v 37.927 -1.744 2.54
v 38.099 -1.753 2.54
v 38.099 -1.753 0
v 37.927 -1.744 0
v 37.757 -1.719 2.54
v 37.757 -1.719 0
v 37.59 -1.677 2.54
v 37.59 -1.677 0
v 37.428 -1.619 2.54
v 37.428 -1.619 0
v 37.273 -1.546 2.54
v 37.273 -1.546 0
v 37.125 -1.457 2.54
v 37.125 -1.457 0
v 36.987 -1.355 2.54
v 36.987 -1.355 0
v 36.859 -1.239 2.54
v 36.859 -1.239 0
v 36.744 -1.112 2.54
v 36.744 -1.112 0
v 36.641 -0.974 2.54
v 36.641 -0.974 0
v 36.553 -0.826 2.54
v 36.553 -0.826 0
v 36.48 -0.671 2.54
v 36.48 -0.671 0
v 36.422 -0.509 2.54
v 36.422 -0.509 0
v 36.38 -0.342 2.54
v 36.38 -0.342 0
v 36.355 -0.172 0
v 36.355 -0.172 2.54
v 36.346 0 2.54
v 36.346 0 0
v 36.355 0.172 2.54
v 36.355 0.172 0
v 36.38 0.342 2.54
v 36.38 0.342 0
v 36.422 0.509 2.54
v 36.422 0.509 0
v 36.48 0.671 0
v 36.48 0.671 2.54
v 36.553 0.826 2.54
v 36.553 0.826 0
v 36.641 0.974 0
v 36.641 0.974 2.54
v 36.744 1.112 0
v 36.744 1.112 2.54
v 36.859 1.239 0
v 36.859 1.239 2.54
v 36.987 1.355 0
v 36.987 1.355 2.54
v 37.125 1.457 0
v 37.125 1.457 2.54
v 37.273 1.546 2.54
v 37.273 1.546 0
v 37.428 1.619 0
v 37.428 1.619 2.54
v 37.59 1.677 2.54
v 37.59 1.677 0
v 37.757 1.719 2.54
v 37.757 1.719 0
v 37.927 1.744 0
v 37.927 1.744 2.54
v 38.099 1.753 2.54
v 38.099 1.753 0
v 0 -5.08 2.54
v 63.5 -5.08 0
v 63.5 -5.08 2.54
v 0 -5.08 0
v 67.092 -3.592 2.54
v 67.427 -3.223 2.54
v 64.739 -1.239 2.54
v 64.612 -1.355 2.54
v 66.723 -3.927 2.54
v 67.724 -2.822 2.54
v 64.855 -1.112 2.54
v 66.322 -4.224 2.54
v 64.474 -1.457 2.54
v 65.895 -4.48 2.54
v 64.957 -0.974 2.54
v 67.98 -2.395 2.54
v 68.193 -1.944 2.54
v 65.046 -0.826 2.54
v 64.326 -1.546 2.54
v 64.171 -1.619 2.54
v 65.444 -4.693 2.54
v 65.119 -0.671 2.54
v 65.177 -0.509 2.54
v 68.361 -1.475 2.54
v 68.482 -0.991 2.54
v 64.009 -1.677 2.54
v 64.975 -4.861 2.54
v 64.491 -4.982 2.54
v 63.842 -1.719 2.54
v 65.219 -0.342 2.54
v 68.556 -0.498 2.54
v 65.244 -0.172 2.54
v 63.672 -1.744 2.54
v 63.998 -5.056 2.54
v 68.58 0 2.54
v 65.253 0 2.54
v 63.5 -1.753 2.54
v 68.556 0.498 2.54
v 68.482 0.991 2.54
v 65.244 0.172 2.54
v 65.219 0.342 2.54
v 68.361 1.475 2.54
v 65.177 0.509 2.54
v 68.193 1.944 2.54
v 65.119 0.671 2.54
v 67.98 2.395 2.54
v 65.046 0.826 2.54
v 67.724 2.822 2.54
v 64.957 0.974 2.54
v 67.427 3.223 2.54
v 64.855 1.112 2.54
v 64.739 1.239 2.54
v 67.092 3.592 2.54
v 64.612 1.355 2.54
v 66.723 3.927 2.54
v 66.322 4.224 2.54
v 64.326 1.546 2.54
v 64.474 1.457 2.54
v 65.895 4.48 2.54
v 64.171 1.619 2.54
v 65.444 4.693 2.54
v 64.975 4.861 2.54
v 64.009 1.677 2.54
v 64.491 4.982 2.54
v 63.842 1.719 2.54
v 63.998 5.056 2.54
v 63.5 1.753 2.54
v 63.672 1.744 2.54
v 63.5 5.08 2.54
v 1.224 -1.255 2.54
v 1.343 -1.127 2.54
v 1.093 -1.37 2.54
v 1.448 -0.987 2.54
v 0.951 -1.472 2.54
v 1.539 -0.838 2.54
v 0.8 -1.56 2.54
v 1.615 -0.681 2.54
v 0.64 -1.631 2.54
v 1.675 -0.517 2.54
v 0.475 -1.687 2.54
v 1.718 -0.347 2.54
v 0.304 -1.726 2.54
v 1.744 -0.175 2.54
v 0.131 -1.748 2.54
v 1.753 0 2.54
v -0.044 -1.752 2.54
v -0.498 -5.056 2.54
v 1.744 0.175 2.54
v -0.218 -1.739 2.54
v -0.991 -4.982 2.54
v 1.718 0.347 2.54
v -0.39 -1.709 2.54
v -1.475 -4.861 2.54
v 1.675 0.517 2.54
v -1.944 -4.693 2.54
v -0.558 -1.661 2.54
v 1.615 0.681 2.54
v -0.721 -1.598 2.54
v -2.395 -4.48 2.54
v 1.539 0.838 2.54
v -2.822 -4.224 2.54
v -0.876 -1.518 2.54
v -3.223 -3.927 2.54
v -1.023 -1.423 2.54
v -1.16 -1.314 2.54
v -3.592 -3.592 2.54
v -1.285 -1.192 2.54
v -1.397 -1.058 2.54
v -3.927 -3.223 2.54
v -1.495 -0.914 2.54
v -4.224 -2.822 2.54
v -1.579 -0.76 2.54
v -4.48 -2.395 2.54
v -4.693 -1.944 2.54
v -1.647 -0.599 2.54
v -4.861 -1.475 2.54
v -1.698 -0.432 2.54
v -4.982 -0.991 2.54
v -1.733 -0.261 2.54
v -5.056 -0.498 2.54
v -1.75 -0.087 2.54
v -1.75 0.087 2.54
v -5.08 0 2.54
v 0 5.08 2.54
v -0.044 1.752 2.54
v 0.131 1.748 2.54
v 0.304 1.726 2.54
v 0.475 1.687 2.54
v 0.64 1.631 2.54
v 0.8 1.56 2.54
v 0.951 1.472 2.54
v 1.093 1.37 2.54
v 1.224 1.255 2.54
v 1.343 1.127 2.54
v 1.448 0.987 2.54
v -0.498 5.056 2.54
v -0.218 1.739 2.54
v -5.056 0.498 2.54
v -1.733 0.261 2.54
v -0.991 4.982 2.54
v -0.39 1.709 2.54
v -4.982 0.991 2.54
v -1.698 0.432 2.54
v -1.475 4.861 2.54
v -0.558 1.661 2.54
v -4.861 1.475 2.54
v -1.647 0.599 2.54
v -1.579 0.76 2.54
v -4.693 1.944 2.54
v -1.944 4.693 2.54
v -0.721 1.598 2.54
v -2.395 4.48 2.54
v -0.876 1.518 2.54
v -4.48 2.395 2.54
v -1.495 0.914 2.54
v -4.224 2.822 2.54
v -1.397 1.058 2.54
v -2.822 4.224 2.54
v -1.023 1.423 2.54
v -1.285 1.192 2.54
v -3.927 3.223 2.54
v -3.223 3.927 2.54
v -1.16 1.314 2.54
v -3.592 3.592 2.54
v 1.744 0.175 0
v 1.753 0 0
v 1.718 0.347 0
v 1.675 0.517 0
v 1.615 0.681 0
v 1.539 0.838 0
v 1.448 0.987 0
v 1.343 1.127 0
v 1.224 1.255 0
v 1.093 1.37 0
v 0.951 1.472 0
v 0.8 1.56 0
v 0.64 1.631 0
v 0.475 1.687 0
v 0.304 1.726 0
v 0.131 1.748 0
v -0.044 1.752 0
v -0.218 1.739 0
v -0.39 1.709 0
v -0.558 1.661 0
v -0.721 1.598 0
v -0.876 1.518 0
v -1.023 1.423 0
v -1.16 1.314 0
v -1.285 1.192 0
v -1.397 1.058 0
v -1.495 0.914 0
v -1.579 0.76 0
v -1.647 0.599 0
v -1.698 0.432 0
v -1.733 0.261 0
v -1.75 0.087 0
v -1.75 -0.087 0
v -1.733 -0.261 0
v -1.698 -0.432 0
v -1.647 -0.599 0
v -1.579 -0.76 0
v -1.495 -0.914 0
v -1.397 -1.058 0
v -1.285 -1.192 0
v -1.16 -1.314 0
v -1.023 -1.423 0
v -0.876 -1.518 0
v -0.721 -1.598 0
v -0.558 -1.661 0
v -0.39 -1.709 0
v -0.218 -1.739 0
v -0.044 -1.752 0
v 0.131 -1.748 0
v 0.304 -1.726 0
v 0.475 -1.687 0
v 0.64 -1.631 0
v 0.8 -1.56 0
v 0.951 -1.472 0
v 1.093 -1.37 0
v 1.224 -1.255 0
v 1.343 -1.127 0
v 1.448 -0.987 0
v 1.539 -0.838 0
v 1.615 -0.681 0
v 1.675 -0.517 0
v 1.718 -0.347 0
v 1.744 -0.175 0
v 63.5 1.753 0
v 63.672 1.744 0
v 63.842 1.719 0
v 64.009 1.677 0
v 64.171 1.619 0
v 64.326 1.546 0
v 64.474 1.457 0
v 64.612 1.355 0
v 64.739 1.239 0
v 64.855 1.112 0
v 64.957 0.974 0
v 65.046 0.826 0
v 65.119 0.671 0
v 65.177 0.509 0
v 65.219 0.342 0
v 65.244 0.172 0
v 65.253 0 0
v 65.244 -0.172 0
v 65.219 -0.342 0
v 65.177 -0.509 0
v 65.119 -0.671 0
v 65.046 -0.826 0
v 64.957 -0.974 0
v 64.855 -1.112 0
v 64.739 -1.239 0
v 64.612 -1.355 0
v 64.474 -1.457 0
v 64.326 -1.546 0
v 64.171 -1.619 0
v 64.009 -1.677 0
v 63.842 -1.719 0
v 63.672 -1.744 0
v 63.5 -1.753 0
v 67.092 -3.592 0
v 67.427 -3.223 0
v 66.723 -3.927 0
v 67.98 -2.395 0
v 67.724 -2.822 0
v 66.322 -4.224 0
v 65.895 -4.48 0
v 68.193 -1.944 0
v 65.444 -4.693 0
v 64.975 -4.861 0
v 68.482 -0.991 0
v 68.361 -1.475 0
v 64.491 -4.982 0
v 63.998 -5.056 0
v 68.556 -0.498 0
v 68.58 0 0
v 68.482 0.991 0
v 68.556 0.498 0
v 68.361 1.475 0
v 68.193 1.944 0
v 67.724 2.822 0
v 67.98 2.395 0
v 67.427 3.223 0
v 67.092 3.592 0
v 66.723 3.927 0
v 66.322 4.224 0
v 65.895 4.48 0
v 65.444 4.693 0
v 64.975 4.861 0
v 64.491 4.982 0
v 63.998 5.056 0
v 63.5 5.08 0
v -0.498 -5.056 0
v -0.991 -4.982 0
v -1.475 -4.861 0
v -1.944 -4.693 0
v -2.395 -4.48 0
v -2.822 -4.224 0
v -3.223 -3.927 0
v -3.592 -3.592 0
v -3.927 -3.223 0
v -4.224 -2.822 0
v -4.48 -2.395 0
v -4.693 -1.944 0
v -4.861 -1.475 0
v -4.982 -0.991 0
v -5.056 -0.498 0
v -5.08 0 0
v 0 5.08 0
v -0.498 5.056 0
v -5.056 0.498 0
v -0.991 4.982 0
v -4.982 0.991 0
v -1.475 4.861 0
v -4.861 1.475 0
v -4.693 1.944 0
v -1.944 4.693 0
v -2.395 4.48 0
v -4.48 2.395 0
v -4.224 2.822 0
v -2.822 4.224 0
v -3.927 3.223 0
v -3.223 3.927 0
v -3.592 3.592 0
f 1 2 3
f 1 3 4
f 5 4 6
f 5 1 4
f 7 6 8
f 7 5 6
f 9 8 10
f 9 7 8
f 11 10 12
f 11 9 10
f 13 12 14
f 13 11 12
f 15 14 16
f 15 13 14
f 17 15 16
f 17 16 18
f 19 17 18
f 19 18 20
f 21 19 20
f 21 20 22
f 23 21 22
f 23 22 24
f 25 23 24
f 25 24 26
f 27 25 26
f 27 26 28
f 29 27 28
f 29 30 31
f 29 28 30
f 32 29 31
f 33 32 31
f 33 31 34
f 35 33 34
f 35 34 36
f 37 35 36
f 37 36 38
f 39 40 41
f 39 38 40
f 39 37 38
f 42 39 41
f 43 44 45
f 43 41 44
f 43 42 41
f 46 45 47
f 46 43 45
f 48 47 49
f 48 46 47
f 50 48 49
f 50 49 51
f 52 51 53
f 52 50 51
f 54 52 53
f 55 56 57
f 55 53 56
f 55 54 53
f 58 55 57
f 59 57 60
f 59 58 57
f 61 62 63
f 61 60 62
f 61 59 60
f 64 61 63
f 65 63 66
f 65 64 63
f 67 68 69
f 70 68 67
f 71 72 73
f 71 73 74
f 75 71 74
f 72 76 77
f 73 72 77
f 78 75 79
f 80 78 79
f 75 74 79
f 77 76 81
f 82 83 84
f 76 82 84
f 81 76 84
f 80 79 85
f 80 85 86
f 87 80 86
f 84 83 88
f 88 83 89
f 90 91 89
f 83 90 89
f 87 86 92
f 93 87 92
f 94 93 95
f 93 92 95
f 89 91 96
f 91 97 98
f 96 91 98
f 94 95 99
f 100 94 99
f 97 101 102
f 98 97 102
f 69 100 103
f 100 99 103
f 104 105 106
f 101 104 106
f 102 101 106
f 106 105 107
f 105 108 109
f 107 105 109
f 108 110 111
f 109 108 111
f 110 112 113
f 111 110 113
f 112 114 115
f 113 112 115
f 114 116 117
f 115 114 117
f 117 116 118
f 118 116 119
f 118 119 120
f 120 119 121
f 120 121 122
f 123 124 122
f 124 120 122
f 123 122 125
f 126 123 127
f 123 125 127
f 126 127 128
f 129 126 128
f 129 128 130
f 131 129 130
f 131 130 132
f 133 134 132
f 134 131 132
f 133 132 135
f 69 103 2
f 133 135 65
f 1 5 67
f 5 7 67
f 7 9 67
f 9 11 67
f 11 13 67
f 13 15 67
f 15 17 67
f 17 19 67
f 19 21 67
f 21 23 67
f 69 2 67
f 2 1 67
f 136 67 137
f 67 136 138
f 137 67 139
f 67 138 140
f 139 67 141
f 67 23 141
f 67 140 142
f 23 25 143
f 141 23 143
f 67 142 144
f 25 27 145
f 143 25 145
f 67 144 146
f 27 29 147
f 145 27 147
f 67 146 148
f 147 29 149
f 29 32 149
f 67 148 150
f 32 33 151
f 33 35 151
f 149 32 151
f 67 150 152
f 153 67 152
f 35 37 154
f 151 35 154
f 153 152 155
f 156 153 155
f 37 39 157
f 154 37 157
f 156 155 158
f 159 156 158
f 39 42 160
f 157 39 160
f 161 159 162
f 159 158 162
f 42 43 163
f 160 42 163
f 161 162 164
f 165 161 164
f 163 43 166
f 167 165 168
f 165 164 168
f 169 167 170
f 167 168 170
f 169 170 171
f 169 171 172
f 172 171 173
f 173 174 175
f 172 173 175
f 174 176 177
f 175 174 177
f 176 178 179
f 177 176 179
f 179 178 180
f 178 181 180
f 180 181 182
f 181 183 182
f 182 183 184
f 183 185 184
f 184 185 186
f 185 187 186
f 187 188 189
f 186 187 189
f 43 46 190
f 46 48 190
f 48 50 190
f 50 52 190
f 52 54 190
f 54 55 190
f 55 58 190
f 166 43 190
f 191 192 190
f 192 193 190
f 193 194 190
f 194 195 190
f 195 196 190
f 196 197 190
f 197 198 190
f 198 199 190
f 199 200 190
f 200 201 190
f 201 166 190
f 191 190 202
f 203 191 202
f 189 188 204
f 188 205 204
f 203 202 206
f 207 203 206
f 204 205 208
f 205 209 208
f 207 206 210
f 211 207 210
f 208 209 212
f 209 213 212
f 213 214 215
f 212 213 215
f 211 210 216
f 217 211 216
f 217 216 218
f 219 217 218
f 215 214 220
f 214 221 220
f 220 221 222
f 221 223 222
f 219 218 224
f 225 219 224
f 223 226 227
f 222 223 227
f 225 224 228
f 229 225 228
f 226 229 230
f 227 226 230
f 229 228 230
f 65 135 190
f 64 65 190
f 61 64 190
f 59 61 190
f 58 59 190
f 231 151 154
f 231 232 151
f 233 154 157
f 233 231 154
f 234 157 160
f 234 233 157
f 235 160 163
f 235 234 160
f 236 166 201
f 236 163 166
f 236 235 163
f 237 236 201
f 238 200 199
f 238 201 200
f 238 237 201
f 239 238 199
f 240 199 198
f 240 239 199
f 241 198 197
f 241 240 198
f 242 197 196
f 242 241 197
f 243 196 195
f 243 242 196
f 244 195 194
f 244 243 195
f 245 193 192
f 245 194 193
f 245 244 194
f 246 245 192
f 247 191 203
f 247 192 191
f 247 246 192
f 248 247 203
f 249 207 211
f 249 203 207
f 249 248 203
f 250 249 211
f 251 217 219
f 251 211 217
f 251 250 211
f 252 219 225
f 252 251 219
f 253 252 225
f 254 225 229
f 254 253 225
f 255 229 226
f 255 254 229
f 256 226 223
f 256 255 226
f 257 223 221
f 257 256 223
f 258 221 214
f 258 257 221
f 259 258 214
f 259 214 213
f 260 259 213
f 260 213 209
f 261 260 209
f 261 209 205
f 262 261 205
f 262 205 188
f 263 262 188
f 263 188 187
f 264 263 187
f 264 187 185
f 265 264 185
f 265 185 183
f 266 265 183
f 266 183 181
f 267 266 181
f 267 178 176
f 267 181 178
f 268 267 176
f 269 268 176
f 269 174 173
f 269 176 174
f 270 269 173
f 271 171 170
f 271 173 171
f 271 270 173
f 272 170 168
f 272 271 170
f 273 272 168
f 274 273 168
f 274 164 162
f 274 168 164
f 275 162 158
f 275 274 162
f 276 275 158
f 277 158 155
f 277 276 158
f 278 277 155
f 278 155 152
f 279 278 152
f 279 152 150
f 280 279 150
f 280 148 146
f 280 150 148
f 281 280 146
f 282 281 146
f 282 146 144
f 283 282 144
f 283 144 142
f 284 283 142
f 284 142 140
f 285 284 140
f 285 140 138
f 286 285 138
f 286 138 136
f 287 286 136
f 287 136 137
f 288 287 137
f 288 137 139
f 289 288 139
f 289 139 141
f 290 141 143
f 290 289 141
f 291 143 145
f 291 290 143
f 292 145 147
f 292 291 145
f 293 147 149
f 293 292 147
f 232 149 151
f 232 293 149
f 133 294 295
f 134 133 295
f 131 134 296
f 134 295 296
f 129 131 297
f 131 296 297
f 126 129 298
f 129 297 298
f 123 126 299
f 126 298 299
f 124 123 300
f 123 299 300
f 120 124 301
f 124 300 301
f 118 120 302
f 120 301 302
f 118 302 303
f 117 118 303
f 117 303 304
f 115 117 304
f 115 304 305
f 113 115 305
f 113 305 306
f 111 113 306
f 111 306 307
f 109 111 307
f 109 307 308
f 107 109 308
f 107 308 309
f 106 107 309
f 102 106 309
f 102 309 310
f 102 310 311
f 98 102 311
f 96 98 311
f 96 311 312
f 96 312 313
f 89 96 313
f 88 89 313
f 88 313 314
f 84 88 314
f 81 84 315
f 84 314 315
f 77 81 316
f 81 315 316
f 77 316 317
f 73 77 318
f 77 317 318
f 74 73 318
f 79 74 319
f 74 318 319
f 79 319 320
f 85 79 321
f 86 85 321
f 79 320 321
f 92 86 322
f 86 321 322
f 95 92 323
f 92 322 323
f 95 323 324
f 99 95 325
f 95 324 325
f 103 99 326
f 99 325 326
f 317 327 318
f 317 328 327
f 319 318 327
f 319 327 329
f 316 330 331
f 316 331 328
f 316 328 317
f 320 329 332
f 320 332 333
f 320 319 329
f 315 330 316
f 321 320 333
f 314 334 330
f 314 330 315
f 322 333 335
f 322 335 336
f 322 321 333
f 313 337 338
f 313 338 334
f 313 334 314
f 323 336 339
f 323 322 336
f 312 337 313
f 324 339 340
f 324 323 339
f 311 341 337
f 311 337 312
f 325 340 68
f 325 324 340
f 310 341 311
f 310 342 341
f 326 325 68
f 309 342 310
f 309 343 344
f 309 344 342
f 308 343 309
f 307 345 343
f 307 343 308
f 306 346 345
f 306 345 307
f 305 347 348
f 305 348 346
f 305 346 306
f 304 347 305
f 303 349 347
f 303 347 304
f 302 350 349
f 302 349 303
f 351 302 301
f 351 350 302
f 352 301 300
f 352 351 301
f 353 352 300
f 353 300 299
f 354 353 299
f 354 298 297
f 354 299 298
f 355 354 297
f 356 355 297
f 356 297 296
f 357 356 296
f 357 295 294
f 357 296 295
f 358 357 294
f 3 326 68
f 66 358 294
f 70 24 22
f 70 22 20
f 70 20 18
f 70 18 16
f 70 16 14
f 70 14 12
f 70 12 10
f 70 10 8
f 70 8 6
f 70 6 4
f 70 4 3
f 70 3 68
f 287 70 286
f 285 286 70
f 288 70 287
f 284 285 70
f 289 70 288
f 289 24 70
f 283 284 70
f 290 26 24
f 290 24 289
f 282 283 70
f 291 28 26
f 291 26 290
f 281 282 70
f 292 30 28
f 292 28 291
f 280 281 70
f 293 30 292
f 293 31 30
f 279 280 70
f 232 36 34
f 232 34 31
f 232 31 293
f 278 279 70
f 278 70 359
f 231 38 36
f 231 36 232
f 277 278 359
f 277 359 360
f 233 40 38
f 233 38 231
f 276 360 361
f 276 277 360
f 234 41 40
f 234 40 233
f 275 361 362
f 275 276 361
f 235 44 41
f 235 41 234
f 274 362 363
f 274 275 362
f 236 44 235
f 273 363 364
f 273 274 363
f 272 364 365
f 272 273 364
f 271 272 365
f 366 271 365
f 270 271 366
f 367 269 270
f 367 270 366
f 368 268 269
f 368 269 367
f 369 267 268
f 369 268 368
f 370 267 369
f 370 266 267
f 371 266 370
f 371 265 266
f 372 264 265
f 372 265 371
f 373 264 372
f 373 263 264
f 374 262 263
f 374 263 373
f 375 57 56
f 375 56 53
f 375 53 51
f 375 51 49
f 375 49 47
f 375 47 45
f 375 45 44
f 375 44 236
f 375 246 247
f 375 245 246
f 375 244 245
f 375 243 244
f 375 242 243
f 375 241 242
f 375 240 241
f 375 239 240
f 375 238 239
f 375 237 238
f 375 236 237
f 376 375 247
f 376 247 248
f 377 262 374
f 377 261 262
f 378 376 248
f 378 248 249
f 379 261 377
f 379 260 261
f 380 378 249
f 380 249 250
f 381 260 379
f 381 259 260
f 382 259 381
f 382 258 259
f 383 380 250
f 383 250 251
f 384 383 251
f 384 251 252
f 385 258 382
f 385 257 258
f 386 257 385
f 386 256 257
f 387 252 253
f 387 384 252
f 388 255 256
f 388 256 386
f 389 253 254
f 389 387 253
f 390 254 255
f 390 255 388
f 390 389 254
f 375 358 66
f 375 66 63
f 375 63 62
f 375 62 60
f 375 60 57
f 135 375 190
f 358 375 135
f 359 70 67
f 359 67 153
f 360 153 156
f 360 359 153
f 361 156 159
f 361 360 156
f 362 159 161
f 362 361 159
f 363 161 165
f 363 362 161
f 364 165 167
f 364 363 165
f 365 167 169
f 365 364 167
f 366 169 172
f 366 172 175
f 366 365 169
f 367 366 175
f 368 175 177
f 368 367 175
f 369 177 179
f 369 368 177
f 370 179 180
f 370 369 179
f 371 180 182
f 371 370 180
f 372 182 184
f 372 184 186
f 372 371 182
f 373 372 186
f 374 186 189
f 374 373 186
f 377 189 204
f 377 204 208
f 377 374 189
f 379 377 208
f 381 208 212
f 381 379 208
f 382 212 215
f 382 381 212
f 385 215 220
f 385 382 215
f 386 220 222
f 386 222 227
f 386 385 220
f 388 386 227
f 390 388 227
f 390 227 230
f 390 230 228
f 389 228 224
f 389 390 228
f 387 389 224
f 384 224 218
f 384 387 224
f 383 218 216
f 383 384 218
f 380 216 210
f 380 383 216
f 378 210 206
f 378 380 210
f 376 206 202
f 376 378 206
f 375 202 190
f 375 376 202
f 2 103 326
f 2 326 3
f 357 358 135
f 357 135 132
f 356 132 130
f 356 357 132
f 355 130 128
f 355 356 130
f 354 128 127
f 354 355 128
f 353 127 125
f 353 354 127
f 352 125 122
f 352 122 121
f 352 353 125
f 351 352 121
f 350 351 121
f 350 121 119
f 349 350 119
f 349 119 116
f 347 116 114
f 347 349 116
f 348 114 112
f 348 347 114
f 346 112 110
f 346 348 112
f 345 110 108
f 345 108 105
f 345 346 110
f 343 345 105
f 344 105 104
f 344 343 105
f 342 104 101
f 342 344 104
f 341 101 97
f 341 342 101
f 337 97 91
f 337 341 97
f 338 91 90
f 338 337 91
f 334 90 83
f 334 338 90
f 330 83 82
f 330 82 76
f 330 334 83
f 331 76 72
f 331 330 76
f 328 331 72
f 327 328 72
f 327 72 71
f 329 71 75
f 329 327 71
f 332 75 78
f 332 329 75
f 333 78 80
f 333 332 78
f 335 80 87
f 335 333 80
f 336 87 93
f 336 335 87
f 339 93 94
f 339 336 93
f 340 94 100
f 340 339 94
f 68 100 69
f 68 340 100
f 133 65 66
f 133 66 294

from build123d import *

# Parameters (mm, degrees)
BOSS_EXTRUDE1_DEPTH     = 2.54
CUT_EXTRUDE1_START      = -3.54
SKETCH2_R               = 1.7526
CUT_EXTRUDE1_DEPTH      = 4.54
CUT_EXTRUDE2_DEPTH      = 1
CUT_EXTRUDE2_DEPTH_BACK = 3.54


with BuildPart() as part:
    # Sketch1 → Boss-Extrude1 (new body)
    with BuildSketch(Plane.XY):
        with BuildLine():
            Line((0, 5.08), (63.5, 5.08))
            ThreePointArc((63.5, 5.08), (68.58, 0), (63.5, -5.08))
            Line((63.5, -5.08), (0, -5.08))
            ThreePointArc((0, -5.08), (-5.08, 0), (0, 5.08))
        make_face()
    extrude(amount=BOSS_EXTRUDE1_DEPTH)

    # Sketch2 → Cut-Extrude1 (cut)
    with BuildSketch(Plane.XY.offset(2.54).offset(CUT_EXTRUDE1_START)):
        Circle(SKETCH2_R)
    cut_extrude1 = extrude(amount=CUT_EXTRUDE1_DEPTH, mode=Mode.SUBTRACT)

    # Mirror1: Cut-Extrude1 across plane
    add(cut_extrude1.mirror(Plane(origin=(31.75, 0, 0), x_dir=(0, 0, 1), z_dir=(1, 0, 0))), mode=Mode.SUBTRACT)

    # Sketch4 → Cut-Extrude2 (cut, two sides)
    with BuildSketch(Plane.XY.offset(2.54)) as cut_extrude2_sk:
        with BuildLine():
            Line((63.5, -1.7526), (38.09873006, -1.7526))
            ThreePointArc((38.09873006, -1.7526), (36.34613006, 0), (38.09873006, 1.7526))
            Line((38.09873006, 1.7526), (63.5, 1.7526))
            ThreePointArc((63.5, 1.7526), (65.2526, 0), (63.5, -1.7526))
        make_face()
    extrude(amount=CUT_EXTRUDE2_DEPTH, mode=Mode.SUBTRACT)
    extrude(cut_extrude2_sk.sketch, amount=-CUT_EXTRUDE2_DEPTH_BACK, mode=Mode.SUBTRACT)


solid = part.part
